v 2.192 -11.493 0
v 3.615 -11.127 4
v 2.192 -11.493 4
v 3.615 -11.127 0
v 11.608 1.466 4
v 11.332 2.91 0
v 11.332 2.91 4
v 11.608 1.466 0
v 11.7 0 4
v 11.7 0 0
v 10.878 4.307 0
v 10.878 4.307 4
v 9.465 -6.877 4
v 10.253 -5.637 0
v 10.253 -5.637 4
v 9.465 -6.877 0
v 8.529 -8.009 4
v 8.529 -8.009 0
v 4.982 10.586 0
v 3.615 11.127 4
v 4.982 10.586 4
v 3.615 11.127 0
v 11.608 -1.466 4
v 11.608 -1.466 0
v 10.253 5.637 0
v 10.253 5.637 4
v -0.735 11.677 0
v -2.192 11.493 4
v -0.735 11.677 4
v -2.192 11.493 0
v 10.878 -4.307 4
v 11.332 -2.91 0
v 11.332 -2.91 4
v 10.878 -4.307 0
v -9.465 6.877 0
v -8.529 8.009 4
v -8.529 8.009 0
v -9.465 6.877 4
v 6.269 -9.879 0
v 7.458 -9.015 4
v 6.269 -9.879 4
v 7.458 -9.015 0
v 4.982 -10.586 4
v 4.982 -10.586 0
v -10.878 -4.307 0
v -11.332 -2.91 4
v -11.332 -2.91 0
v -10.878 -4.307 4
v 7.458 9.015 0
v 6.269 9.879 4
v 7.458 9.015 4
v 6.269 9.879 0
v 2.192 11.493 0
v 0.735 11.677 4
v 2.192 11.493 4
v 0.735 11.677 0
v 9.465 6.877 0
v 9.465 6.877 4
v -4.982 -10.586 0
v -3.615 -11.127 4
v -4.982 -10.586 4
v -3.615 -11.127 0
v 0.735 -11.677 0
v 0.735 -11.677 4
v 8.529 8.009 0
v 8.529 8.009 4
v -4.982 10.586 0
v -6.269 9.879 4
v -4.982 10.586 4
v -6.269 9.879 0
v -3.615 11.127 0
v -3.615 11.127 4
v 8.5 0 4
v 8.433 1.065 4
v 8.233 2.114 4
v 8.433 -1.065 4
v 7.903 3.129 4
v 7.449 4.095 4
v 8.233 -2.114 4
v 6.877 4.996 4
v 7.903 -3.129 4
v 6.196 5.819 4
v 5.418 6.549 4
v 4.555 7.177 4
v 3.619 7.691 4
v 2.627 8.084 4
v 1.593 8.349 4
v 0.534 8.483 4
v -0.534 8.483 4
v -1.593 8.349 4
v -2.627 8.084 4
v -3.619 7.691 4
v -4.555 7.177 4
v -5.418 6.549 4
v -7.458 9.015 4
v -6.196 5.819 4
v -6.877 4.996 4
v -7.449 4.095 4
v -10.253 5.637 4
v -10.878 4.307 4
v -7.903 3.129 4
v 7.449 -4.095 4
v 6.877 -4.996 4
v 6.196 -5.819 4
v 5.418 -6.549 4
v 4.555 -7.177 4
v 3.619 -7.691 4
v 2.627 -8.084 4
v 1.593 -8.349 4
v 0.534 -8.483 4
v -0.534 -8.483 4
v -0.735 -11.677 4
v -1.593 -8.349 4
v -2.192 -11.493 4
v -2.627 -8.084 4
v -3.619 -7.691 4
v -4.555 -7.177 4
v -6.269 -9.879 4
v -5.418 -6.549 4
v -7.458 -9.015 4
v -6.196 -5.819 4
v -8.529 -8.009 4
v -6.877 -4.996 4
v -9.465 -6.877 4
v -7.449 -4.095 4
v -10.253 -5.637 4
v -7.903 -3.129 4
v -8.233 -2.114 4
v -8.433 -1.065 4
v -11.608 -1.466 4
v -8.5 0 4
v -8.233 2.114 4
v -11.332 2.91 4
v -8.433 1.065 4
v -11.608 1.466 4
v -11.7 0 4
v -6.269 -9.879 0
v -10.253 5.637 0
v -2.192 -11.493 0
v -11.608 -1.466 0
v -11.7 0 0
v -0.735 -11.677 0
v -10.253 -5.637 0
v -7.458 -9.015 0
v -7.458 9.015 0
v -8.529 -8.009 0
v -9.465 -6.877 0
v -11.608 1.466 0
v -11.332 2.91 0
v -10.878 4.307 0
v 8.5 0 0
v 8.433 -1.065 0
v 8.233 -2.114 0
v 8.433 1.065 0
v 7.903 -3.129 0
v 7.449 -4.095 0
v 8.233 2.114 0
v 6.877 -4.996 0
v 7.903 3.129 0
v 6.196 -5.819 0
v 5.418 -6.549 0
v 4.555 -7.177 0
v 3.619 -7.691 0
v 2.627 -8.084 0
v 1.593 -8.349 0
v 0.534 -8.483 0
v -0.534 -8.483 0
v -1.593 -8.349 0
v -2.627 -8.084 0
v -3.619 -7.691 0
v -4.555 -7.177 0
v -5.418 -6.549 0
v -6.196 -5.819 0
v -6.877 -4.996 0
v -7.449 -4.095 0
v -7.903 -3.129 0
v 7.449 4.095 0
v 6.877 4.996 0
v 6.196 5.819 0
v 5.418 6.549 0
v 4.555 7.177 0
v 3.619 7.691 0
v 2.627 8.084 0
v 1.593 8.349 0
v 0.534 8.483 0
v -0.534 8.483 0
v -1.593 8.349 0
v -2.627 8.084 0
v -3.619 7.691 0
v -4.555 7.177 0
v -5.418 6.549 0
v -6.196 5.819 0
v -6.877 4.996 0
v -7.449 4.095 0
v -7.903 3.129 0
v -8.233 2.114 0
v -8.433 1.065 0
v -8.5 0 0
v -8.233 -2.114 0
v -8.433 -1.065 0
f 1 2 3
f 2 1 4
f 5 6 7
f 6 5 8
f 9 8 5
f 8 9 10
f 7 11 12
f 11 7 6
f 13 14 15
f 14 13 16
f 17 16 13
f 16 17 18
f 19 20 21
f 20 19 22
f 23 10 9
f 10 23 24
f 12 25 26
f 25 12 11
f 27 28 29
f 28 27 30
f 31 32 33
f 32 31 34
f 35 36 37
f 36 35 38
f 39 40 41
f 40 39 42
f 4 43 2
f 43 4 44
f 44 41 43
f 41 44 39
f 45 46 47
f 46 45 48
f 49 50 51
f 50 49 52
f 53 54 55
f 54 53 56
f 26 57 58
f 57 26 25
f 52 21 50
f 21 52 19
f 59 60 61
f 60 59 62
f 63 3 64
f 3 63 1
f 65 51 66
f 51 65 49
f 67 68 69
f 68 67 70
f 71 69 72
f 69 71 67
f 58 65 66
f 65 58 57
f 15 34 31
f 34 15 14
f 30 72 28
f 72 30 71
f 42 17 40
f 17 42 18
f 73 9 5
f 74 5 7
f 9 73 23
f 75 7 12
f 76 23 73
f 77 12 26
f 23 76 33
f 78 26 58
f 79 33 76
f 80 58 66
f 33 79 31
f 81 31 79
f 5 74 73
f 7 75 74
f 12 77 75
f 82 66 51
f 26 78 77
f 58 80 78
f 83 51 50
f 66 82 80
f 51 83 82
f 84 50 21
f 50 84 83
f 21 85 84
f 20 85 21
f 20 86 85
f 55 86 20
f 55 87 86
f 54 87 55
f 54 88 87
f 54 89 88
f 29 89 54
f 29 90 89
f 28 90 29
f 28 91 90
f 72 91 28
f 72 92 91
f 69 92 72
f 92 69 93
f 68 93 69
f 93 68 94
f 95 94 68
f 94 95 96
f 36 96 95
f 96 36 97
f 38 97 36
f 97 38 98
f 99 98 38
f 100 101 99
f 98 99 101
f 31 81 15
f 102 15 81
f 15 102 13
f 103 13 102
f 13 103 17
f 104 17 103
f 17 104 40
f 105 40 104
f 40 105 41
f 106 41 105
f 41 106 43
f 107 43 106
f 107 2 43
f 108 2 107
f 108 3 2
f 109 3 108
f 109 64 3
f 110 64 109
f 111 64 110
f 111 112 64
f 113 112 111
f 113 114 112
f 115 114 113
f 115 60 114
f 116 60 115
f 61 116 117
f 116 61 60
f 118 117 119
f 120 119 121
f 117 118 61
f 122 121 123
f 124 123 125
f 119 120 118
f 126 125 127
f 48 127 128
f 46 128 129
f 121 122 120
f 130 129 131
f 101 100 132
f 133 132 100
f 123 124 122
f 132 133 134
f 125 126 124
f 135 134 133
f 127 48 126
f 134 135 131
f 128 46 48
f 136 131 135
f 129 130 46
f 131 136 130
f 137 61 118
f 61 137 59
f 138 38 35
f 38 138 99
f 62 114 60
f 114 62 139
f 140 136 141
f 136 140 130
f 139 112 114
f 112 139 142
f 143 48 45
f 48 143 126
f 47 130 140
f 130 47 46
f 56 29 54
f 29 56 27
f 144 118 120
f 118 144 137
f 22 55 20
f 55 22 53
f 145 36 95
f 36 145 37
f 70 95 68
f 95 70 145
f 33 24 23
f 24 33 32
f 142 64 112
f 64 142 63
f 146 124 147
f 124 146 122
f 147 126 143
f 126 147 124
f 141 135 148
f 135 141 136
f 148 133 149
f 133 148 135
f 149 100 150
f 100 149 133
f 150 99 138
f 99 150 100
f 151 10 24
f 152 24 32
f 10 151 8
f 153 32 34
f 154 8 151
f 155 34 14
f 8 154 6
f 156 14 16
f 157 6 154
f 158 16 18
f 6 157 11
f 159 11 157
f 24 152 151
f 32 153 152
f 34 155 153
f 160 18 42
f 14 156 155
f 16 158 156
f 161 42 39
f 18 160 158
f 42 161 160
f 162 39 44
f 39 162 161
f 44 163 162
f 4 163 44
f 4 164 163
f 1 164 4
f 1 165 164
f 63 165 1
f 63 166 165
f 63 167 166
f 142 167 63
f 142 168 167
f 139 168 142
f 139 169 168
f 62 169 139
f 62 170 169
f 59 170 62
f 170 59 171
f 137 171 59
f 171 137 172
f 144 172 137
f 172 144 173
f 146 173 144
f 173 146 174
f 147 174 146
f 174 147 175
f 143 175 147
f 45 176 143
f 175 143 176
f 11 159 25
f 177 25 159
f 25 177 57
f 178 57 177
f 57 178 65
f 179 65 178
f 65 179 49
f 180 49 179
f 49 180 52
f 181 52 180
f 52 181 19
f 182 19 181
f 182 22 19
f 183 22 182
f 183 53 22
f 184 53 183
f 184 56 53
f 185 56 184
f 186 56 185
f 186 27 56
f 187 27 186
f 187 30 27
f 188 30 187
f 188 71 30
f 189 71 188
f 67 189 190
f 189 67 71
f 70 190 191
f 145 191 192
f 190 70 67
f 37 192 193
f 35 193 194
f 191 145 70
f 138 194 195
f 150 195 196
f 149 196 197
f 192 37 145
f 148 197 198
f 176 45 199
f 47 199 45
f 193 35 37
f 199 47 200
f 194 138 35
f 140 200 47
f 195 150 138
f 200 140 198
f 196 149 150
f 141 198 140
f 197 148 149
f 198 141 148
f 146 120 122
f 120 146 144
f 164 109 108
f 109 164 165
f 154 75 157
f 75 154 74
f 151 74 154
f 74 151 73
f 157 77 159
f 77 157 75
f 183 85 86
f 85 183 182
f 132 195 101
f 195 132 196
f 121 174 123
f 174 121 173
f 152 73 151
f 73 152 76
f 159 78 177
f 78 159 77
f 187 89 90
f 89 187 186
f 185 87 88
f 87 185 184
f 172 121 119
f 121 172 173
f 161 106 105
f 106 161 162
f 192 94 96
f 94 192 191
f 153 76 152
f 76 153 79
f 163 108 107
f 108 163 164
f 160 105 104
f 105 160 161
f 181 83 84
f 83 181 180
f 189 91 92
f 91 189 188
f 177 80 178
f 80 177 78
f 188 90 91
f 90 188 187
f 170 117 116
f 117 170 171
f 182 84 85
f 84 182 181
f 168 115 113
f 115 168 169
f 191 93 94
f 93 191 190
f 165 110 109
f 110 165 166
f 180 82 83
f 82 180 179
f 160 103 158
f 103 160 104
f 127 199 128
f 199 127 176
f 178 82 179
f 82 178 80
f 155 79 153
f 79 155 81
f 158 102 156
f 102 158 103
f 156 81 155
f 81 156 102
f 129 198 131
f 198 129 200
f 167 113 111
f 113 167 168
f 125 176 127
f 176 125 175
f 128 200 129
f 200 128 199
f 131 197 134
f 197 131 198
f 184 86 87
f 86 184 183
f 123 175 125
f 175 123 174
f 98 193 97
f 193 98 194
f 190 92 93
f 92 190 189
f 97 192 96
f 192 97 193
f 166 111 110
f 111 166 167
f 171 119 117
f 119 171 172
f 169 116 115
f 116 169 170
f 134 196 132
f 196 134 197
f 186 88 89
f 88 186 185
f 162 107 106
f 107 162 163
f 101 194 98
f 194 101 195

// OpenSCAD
$fn = 50;


difference() {
	union() {
		cylinder(h = 4, r = 11.7000000000);
	}
	union() {
		cylinder(h = 4, r = 8.5000000000);
	}
}
